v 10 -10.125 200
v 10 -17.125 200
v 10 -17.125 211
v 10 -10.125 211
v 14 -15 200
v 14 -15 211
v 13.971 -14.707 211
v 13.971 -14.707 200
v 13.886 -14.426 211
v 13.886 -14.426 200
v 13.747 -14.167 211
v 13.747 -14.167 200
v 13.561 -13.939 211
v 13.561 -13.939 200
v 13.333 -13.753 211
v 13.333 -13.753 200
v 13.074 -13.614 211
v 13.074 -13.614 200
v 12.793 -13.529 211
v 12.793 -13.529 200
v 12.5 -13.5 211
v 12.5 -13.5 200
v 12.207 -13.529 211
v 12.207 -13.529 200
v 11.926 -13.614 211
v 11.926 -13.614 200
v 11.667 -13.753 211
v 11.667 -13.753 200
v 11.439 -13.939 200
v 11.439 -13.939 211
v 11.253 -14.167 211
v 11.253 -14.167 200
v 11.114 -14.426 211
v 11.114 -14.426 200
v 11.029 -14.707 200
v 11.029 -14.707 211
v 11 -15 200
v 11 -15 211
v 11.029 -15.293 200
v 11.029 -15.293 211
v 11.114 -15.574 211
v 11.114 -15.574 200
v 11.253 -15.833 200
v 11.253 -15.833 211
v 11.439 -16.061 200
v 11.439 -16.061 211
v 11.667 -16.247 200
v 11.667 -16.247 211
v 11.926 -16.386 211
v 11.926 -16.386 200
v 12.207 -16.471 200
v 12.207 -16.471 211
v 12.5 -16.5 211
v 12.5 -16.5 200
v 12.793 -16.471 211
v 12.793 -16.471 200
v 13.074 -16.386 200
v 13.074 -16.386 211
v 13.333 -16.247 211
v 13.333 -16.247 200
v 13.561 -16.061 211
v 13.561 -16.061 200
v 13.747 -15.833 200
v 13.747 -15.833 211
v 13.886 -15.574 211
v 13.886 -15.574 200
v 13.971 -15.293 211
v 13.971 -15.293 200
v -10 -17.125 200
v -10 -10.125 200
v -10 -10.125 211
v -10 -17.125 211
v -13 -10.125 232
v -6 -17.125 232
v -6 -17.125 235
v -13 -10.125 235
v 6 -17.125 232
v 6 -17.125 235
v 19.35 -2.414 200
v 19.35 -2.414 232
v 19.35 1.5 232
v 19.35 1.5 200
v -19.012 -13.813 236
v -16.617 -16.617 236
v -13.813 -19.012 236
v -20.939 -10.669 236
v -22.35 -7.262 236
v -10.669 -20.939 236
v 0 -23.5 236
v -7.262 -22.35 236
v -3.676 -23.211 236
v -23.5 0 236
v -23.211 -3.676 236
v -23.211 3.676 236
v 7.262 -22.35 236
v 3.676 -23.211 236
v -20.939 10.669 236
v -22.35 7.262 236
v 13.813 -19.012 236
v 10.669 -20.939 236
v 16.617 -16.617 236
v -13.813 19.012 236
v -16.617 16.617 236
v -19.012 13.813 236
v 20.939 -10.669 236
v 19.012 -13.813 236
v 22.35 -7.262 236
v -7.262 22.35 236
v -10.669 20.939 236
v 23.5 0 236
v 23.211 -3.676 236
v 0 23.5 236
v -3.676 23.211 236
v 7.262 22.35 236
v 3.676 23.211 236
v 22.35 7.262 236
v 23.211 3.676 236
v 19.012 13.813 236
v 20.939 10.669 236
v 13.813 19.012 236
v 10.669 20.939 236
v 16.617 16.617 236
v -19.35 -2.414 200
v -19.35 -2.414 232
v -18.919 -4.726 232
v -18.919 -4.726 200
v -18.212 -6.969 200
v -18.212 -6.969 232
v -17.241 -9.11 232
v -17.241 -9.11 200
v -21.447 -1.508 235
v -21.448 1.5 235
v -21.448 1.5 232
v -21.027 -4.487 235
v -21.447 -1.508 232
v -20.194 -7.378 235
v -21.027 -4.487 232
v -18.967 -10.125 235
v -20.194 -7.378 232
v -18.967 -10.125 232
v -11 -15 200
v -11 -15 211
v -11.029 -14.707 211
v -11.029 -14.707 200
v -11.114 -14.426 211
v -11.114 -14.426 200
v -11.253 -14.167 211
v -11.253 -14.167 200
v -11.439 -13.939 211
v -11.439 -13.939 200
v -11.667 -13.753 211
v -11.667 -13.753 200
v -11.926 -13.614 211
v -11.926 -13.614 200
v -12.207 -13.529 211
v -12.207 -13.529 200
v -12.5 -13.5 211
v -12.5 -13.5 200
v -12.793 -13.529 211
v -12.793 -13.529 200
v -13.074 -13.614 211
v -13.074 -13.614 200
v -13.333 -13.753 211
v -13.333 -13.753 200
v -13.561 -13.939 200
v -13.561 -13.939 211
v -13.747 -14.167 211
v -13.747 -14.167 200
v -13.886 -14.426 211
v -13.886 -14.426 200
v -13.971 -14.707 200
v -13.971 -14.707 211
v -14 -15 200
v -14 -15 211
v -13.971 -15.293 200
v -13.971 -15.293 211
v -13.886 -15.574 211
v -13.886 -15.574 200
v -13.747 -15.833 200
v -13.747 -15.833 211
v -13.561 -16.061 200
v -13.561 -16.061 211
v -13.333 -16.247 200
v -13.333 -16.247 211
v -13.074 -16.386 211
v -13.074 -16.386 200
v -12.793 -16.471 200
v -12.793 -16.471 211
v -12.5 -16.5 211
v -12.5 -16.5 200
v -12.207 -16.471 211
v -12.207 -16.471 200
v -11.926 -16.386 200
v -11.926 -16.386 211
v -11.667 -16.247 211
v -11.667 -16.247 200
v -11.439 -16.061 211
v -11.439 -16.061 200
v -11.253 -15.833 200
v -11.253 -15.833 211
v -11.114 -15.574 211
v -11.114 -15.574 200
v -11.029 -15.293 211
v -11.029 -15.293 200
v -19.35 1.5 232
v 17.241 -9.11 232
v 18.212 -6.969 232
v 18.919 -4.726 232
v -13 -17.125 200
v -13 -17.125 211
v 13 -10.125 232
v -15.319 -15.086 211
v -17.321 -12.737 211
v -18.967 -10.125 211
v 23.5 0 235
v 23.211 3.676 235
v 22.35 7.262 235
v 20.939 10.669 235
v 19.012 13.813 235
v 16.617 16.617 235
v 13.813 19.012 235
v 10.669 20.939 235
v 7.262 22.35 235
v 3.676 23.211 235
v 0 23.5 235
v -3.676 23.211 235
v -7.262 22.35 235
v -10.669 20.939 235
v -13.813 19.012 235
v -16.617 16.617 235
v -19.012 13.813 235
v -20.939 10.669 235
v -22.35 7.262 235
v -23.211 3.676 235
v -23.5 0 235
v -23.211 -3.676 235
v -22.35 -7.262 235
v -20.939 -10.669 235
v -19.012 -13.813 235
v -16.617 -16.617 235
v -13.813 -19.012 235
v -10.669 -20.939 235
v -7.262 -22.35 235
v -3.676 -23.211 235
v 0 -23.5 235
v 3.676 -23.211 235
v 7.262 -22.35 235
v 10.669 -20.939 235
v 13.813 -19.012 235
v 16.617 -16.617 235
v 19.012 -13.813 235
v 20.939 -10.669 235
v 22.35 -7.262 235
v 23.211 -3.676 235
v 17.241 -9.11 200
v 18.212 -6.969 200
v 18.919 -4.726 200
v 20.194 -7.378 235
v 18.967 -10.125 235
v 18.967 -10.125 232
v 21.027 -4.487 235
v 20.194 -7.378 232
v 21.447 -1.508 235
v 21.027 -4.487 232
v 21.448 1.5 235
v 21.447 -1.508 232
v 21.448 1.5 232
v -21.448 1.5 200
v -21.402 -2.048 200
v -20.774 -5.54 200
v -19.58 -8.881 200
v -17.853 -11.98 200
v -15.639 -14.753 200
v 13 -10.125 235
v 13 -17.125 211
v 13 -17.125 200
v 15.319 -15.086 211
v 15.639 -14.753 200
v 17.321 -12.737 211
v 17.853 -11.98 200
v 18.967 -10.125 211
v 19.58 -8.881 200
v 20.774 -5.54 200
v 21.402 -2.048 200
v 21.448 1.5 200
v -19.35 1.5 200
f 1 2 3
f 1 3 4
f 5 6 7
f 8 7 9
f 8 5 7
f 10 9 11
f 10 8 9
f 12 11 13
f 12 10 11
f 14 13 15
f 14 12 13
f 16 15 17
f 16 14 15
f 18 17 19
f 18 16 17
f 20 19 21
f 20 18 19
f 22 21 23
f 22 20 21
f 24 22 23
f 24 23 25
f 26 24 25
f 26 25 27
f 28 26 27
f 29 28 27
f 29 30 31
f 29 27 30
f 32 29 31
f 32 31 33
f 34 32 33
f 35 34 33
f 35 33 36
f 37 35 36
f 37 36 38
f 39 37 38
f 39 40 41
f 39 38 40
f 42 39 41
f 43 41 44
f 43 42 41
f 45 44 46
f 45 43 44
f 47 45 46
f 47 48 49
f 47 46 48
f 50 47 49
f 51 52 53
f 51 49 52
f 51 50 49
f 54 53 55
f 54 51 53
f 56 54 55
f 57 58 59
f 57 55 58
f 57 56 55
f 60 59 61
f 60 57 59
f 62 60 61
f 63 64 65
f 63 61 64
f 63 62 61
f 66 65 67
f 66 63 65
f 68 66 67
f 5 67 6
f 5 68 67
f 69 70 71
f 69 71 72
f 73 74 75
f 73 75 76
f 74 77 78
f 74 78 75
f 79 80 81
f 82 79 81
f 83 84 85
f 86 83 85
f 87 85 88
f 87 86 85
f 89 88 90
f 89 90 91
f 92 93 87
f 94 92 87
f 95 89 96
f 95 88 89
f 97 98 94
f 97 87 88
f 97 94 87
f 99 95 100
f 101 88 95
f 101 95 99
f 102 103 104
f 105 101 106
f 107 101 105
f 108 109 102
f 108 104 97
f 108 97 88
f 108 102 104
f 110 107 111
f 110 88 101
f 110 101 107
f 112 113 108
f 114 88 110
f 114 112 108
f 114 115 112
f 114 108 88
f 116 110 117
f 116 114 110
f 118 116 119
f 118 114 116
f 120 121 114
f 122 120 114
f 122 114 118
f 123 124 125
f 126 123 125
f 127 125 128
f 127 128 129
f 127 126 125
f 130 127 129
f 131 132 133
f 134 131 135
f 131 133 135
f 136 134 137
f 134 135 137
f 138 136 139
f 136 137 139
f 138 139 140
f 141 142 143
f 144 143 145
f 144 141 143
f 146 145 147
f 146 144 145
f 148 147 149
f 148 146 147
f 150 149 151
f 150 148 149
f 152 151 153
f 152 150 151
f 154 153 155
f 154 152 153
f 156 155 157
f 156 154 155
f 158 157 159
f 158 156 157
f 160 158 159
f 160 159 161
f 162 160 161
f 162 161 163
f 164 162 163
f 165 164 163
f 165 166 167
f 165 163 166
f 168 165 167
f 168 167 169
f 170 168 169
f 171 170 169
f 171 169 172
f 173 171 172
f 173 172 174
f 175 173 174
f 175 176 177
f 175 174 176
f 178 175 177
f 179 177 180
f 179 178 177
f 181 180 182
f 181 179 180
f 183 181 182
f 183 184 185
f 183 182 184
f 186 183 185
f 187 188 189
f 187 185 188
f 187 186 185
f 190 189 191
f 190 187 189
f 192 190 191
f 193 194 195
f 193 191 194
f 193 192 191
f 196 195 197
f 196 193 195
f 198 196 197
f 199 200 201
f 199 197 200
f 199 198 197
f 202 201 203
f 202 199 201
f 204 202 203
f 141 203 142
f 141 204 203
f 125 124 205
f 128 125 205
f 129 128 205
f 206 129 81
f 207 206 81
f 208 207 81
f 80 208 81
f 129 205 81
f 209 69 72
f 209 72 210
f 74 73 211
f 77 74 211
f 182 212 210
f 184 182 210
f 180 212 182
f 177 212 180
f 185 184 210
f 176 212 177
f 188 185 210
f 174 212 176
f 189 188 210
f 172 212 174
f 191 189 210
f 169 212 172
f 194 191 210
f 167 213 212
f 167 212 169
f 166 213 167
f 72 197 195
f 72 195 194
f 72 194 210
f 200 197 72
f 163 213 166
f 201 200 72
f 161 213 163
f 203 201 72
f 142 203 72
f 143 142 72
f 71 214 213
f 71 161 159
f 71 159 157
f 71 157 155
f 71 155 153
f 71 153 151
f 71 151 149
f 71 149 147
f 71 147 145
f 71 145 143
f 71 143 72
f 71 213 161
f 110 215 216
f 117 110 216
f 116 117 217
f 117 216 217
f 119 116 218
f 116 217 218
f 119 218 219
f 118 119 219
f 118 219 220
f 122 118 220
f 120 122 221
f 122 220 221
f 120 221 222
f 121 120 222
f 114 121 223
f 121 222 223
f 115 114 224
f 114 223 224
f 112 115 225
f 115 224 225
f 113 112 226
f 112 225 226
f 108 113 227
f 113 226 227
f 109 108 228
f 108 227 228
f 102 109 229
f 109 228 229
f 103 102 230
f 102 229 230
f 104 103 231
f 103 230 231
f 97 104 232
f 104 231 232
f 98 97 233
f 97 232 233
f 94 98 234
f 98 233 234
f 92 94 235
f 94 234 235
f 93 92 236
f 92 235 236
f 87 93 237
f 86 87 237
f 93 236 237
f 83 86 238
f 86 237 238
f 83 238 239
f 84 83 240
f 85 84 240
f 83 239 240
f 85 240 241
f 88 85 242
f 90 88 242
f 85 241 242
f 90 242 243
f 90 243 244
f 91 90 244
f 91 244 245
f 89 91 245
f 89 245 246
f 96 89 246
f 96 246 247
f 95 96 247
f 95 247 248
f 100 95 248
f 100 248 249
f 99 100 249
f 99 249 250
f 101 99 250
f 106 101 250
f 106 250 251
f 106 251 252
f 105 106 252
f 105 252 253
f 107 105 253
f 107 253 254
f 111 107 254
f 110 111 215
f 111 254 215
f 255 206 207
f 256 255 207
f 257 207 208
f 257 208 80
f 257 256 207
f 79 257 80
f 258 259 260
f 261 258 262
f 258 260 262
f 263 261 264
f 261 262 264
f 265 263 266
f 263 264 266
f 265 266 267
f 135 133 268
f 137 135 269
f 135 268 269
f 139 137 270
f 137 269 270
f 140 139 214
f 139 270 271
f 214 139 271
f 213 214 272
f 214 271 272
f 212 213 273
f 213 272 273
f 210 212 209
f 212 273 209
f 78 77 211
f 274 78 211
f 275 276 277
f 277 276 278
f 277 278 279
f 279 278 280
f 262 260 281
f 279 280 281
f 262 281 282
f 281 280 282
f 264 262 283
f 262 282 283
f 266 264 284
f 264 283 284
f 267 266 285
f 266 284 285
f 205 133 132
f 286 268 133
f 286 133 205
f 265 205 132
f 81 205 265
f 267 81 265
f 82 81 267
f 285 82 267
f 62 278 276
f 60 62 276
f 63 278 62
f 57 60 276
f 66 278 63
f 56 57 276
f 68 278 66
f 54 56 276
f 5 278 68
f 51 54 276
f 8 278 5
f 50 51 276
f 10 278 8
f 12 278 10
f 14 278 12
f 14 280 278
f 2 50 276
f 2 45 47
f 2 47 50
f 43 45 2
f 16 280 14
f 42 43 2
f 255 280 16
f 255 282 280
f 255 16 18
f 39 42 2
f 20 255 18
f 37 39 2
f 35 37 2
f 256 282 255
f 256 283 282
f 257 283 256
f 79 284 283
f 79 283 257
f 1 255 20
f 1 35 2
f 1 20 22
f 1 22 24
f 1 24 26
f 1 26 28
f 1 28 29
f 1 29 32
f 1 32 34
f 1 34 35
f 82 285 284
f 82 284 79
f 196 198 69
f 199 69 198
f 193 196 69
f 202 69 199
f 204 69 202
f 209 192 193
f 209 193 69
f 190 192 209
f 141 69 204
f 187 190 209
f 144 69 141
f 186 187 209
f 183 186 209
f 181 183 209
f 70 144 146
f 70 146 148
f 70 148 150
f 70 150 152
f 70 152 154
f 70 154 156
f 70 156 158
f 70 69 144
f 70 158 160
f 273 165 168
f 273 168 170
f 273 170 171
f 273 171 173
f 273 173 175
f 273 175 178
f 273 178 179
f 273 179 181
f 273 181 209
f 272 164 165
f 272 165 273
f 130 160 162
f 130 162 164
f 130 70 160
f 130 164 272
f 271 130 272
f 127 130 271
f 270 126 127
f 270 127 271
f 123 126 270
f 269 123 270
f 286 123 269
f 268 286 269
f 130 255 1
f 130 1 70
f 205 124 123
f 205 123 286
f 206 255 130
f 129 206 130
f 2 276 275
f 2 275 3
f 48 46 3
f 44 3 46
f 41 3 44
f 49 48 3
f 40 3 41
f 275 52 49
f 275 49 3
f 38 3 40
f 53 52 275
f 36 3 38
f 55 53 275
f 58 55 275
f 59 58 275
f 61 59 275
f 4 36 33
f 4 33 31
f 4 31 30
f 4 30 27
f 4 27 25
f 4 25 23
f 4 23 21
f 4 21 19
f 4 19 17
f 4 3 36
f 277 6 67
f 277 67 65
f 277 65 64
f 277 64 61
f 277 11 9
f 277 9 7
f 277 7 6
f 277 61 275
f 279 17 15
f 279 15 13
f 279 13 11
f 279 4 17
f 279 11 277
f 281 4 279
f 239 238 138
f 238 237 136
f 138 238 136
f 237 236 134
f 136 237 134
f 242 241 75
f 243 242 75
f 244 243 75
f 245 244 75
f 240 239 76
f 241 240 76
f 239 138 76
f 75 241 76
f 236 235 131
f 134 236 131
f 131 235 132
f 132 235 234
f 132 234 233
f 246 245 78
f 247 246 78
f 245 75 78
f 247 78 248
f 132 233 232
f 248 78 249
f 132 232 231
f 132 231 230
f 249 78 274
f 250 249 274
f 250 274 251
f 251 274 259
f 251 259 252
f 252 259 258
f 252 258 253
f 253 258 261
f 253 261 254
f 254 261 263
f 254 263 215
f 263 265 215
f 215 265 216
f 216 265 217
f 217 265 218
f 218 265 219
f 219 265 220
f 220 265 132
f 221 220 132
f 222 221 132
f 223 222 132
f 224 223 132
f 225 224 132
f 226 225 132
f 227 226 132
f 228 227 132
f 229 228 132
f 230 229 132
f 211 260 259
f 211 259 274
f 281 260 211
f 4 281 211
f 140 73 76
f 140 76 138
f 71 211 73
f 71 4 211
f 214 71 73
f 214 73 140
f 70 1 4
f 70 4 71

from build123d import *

# Parameters (mm, degrees)
SKETCH046_R     = 1.5
PAD026_DEPTH    = 32
POCKET016_DEPTH = 21
SKETCH049_W     = 38.6999153105
SKETCH049_H     = 8
POCKET017_DEPTH = 50
PAD027_DEPTH    = 3
SKETCH050_W     = 42.8952211791
SKETCH050_H     = 8
POCKET018_DEPTH = 32
SKETCH051_R     = 23.5
PAD028_DEPTH    = 1


with BuildPart() as part:
    # Sketch046 → Pad026 (new body)
    with BuildSketch(Plane.XY):
        with BuildLine():
            Line((-21.3218441303, 2.7620577266), (-17, 2))
            Line((-17, 2), (-17, 1))
            Line((-17, 1), (-19, 1))
            Line((-19, 1), (-19, -1))
            Line((-19, -1), (-17, -1))
            Line((-17, -1), (-17, -2))
            Line((-19.3499576553, -2.4143609381), (-17, -2))
            ThreePointArc((-19.3499576553, -2.4143609381), (-18.5993421546, -5.8578555305), (-17.2411687539, -9.11))
            Line((17.2411687539, -9.11), (-17.2411687539, -9.11))
            ThreePointArc((17.2411687539, -9.11), (18.5993421546, -5.8578555305), (19.3499576553, -2.4143609381))
            Line((19.3499576553, -2.4143609381), (17, -2))
            Line((17, -2), (17, -1))
            Line((17, -1), (19, -1))
            Line((19, -1), (19, 1))
            Line((19, 1), (17, 1))
            Line((17, 1), (17, 2))
            Line((17, 2), (21.3218441303, 2.7620577266))
            ThreePointArc((13, -17.1245437895), (19.8334685845, -8.2996098649), (21.3218441303, 2.7620577266))
            Line((13, -17.1245437895), (10, -17.1245437895))
            Line((10, -17.1245437895), (10, -10.1245437895))
            Line((10, -10.1245437895), (-10, -10.1245437895))
            Line((-10, -10.1245437895), (-10, -17.1245437895))
            Line((-10, -17.1245437895), (-13, -17.1245437895))
            ThreePointArc((-21.3218441303, 2.7620577266), (-19.8334685845, -8.2996098649), (-13, -17.1245437895))
        make_face()
        with Locations((-12.5, -15)):
            Circle(SKETCH046_R, mode=Mode.SUBTRACT)
        with Locations((12.5, -15)):
            Circle(SKETCH046_R, mode=Mode.SUBTRACT)
    extrude(amount=PAD026_DEPTH)

    # Sketch047 (on Face28 of Pad026) → Pocket016 (cut)
    with BuildSketch(Plane.XY.offset(32)):
        with BuildLine():
            ThreePointArc((-18.9669083684, -10.1245437895), (-16.3621761284, -13.9473722379), (-13, -17.1245437895))
            Line((-13, -17.1245437895), (13, -17.1245437895))
            ThreePointArc((13, -17.1245437895), (16.3621761284, -13.9473722379), (18.9669083684, -10.1245437895))
            Line((-18.9669083684, -10.1245437895), (18.9669083684, -10.1245437895))
        make_face()
    extrude(amount=-POCKET016_DEPTH, mode=Mode.SUBTRACT)

    # Sketch049 (on Face5 of Pocket016) → Pocket017 (cut)
    with BuildSketch(Plane.XY.offset(32)):
        with Locations((0, 1.5856390619)):
            Rectangle(SKETCH049_W, SKETCH049_H)
    extrude(amount=-POCKET017_DEPTH, mode=Mode.SUBTRACT)

    # Sketch048 (on Face5 of Pocket016) → Pad027 (join)
    with BuildSketch(Plane.XY.offset(32)):
        with BuildLine():
            ThreePointArc((-21.4476105895, 1.5), (-21.02655084, -4.4871104034), (-18.9669083684, -10.1245437895))
            Line((-13, -10.1245437895), (-18.9669083684, -10.1245437895))
            Line((-6, -17.1245437895), (-13, -10.1245437895))
            Line((6, -17.1245437895), (-6, -17.1245437895))
            Line((6, -17.1245437895), (13, -10.1245437895))
            Line((13, -10.1245437895), (18.9669083684, -10.1245437895))
            ThreePointArc((18.9669083684, -10.1245437895), (21.02655084, -4.4871104034), (21.4476105895, 1.5))
            Line((-21.4476105895, 1.5), (21.4476105895, 1.5))
        make_face()
    extrude(amount=PAD027_DEPTH)

    # Sketch050 (on Face24 of Pad027) → Pocket018 (cut)
    with BuildSketch(Plane.XY.offset(32)):
        with Locations((0, 5.5)):
            Rectangle(SKETCH050_W, SKETCH050_H)
    extrude(amount=-POCKET018_DEPTH, mode=Mode.SUBTRACT)

    # Sketch051 (on Face27 of Pocket018) → Pad028 (join)
    with BuildSketch(Plane.XY.offset(35)):
        Circle(SKETCH051_R)
    extrude(amount=PAD028_DEPTH)


with BuildPart() as part_1:
    # Body018 placement: moved
    add(part.part.moved(Location((0, 0, 200))))


solid = part_1.part
